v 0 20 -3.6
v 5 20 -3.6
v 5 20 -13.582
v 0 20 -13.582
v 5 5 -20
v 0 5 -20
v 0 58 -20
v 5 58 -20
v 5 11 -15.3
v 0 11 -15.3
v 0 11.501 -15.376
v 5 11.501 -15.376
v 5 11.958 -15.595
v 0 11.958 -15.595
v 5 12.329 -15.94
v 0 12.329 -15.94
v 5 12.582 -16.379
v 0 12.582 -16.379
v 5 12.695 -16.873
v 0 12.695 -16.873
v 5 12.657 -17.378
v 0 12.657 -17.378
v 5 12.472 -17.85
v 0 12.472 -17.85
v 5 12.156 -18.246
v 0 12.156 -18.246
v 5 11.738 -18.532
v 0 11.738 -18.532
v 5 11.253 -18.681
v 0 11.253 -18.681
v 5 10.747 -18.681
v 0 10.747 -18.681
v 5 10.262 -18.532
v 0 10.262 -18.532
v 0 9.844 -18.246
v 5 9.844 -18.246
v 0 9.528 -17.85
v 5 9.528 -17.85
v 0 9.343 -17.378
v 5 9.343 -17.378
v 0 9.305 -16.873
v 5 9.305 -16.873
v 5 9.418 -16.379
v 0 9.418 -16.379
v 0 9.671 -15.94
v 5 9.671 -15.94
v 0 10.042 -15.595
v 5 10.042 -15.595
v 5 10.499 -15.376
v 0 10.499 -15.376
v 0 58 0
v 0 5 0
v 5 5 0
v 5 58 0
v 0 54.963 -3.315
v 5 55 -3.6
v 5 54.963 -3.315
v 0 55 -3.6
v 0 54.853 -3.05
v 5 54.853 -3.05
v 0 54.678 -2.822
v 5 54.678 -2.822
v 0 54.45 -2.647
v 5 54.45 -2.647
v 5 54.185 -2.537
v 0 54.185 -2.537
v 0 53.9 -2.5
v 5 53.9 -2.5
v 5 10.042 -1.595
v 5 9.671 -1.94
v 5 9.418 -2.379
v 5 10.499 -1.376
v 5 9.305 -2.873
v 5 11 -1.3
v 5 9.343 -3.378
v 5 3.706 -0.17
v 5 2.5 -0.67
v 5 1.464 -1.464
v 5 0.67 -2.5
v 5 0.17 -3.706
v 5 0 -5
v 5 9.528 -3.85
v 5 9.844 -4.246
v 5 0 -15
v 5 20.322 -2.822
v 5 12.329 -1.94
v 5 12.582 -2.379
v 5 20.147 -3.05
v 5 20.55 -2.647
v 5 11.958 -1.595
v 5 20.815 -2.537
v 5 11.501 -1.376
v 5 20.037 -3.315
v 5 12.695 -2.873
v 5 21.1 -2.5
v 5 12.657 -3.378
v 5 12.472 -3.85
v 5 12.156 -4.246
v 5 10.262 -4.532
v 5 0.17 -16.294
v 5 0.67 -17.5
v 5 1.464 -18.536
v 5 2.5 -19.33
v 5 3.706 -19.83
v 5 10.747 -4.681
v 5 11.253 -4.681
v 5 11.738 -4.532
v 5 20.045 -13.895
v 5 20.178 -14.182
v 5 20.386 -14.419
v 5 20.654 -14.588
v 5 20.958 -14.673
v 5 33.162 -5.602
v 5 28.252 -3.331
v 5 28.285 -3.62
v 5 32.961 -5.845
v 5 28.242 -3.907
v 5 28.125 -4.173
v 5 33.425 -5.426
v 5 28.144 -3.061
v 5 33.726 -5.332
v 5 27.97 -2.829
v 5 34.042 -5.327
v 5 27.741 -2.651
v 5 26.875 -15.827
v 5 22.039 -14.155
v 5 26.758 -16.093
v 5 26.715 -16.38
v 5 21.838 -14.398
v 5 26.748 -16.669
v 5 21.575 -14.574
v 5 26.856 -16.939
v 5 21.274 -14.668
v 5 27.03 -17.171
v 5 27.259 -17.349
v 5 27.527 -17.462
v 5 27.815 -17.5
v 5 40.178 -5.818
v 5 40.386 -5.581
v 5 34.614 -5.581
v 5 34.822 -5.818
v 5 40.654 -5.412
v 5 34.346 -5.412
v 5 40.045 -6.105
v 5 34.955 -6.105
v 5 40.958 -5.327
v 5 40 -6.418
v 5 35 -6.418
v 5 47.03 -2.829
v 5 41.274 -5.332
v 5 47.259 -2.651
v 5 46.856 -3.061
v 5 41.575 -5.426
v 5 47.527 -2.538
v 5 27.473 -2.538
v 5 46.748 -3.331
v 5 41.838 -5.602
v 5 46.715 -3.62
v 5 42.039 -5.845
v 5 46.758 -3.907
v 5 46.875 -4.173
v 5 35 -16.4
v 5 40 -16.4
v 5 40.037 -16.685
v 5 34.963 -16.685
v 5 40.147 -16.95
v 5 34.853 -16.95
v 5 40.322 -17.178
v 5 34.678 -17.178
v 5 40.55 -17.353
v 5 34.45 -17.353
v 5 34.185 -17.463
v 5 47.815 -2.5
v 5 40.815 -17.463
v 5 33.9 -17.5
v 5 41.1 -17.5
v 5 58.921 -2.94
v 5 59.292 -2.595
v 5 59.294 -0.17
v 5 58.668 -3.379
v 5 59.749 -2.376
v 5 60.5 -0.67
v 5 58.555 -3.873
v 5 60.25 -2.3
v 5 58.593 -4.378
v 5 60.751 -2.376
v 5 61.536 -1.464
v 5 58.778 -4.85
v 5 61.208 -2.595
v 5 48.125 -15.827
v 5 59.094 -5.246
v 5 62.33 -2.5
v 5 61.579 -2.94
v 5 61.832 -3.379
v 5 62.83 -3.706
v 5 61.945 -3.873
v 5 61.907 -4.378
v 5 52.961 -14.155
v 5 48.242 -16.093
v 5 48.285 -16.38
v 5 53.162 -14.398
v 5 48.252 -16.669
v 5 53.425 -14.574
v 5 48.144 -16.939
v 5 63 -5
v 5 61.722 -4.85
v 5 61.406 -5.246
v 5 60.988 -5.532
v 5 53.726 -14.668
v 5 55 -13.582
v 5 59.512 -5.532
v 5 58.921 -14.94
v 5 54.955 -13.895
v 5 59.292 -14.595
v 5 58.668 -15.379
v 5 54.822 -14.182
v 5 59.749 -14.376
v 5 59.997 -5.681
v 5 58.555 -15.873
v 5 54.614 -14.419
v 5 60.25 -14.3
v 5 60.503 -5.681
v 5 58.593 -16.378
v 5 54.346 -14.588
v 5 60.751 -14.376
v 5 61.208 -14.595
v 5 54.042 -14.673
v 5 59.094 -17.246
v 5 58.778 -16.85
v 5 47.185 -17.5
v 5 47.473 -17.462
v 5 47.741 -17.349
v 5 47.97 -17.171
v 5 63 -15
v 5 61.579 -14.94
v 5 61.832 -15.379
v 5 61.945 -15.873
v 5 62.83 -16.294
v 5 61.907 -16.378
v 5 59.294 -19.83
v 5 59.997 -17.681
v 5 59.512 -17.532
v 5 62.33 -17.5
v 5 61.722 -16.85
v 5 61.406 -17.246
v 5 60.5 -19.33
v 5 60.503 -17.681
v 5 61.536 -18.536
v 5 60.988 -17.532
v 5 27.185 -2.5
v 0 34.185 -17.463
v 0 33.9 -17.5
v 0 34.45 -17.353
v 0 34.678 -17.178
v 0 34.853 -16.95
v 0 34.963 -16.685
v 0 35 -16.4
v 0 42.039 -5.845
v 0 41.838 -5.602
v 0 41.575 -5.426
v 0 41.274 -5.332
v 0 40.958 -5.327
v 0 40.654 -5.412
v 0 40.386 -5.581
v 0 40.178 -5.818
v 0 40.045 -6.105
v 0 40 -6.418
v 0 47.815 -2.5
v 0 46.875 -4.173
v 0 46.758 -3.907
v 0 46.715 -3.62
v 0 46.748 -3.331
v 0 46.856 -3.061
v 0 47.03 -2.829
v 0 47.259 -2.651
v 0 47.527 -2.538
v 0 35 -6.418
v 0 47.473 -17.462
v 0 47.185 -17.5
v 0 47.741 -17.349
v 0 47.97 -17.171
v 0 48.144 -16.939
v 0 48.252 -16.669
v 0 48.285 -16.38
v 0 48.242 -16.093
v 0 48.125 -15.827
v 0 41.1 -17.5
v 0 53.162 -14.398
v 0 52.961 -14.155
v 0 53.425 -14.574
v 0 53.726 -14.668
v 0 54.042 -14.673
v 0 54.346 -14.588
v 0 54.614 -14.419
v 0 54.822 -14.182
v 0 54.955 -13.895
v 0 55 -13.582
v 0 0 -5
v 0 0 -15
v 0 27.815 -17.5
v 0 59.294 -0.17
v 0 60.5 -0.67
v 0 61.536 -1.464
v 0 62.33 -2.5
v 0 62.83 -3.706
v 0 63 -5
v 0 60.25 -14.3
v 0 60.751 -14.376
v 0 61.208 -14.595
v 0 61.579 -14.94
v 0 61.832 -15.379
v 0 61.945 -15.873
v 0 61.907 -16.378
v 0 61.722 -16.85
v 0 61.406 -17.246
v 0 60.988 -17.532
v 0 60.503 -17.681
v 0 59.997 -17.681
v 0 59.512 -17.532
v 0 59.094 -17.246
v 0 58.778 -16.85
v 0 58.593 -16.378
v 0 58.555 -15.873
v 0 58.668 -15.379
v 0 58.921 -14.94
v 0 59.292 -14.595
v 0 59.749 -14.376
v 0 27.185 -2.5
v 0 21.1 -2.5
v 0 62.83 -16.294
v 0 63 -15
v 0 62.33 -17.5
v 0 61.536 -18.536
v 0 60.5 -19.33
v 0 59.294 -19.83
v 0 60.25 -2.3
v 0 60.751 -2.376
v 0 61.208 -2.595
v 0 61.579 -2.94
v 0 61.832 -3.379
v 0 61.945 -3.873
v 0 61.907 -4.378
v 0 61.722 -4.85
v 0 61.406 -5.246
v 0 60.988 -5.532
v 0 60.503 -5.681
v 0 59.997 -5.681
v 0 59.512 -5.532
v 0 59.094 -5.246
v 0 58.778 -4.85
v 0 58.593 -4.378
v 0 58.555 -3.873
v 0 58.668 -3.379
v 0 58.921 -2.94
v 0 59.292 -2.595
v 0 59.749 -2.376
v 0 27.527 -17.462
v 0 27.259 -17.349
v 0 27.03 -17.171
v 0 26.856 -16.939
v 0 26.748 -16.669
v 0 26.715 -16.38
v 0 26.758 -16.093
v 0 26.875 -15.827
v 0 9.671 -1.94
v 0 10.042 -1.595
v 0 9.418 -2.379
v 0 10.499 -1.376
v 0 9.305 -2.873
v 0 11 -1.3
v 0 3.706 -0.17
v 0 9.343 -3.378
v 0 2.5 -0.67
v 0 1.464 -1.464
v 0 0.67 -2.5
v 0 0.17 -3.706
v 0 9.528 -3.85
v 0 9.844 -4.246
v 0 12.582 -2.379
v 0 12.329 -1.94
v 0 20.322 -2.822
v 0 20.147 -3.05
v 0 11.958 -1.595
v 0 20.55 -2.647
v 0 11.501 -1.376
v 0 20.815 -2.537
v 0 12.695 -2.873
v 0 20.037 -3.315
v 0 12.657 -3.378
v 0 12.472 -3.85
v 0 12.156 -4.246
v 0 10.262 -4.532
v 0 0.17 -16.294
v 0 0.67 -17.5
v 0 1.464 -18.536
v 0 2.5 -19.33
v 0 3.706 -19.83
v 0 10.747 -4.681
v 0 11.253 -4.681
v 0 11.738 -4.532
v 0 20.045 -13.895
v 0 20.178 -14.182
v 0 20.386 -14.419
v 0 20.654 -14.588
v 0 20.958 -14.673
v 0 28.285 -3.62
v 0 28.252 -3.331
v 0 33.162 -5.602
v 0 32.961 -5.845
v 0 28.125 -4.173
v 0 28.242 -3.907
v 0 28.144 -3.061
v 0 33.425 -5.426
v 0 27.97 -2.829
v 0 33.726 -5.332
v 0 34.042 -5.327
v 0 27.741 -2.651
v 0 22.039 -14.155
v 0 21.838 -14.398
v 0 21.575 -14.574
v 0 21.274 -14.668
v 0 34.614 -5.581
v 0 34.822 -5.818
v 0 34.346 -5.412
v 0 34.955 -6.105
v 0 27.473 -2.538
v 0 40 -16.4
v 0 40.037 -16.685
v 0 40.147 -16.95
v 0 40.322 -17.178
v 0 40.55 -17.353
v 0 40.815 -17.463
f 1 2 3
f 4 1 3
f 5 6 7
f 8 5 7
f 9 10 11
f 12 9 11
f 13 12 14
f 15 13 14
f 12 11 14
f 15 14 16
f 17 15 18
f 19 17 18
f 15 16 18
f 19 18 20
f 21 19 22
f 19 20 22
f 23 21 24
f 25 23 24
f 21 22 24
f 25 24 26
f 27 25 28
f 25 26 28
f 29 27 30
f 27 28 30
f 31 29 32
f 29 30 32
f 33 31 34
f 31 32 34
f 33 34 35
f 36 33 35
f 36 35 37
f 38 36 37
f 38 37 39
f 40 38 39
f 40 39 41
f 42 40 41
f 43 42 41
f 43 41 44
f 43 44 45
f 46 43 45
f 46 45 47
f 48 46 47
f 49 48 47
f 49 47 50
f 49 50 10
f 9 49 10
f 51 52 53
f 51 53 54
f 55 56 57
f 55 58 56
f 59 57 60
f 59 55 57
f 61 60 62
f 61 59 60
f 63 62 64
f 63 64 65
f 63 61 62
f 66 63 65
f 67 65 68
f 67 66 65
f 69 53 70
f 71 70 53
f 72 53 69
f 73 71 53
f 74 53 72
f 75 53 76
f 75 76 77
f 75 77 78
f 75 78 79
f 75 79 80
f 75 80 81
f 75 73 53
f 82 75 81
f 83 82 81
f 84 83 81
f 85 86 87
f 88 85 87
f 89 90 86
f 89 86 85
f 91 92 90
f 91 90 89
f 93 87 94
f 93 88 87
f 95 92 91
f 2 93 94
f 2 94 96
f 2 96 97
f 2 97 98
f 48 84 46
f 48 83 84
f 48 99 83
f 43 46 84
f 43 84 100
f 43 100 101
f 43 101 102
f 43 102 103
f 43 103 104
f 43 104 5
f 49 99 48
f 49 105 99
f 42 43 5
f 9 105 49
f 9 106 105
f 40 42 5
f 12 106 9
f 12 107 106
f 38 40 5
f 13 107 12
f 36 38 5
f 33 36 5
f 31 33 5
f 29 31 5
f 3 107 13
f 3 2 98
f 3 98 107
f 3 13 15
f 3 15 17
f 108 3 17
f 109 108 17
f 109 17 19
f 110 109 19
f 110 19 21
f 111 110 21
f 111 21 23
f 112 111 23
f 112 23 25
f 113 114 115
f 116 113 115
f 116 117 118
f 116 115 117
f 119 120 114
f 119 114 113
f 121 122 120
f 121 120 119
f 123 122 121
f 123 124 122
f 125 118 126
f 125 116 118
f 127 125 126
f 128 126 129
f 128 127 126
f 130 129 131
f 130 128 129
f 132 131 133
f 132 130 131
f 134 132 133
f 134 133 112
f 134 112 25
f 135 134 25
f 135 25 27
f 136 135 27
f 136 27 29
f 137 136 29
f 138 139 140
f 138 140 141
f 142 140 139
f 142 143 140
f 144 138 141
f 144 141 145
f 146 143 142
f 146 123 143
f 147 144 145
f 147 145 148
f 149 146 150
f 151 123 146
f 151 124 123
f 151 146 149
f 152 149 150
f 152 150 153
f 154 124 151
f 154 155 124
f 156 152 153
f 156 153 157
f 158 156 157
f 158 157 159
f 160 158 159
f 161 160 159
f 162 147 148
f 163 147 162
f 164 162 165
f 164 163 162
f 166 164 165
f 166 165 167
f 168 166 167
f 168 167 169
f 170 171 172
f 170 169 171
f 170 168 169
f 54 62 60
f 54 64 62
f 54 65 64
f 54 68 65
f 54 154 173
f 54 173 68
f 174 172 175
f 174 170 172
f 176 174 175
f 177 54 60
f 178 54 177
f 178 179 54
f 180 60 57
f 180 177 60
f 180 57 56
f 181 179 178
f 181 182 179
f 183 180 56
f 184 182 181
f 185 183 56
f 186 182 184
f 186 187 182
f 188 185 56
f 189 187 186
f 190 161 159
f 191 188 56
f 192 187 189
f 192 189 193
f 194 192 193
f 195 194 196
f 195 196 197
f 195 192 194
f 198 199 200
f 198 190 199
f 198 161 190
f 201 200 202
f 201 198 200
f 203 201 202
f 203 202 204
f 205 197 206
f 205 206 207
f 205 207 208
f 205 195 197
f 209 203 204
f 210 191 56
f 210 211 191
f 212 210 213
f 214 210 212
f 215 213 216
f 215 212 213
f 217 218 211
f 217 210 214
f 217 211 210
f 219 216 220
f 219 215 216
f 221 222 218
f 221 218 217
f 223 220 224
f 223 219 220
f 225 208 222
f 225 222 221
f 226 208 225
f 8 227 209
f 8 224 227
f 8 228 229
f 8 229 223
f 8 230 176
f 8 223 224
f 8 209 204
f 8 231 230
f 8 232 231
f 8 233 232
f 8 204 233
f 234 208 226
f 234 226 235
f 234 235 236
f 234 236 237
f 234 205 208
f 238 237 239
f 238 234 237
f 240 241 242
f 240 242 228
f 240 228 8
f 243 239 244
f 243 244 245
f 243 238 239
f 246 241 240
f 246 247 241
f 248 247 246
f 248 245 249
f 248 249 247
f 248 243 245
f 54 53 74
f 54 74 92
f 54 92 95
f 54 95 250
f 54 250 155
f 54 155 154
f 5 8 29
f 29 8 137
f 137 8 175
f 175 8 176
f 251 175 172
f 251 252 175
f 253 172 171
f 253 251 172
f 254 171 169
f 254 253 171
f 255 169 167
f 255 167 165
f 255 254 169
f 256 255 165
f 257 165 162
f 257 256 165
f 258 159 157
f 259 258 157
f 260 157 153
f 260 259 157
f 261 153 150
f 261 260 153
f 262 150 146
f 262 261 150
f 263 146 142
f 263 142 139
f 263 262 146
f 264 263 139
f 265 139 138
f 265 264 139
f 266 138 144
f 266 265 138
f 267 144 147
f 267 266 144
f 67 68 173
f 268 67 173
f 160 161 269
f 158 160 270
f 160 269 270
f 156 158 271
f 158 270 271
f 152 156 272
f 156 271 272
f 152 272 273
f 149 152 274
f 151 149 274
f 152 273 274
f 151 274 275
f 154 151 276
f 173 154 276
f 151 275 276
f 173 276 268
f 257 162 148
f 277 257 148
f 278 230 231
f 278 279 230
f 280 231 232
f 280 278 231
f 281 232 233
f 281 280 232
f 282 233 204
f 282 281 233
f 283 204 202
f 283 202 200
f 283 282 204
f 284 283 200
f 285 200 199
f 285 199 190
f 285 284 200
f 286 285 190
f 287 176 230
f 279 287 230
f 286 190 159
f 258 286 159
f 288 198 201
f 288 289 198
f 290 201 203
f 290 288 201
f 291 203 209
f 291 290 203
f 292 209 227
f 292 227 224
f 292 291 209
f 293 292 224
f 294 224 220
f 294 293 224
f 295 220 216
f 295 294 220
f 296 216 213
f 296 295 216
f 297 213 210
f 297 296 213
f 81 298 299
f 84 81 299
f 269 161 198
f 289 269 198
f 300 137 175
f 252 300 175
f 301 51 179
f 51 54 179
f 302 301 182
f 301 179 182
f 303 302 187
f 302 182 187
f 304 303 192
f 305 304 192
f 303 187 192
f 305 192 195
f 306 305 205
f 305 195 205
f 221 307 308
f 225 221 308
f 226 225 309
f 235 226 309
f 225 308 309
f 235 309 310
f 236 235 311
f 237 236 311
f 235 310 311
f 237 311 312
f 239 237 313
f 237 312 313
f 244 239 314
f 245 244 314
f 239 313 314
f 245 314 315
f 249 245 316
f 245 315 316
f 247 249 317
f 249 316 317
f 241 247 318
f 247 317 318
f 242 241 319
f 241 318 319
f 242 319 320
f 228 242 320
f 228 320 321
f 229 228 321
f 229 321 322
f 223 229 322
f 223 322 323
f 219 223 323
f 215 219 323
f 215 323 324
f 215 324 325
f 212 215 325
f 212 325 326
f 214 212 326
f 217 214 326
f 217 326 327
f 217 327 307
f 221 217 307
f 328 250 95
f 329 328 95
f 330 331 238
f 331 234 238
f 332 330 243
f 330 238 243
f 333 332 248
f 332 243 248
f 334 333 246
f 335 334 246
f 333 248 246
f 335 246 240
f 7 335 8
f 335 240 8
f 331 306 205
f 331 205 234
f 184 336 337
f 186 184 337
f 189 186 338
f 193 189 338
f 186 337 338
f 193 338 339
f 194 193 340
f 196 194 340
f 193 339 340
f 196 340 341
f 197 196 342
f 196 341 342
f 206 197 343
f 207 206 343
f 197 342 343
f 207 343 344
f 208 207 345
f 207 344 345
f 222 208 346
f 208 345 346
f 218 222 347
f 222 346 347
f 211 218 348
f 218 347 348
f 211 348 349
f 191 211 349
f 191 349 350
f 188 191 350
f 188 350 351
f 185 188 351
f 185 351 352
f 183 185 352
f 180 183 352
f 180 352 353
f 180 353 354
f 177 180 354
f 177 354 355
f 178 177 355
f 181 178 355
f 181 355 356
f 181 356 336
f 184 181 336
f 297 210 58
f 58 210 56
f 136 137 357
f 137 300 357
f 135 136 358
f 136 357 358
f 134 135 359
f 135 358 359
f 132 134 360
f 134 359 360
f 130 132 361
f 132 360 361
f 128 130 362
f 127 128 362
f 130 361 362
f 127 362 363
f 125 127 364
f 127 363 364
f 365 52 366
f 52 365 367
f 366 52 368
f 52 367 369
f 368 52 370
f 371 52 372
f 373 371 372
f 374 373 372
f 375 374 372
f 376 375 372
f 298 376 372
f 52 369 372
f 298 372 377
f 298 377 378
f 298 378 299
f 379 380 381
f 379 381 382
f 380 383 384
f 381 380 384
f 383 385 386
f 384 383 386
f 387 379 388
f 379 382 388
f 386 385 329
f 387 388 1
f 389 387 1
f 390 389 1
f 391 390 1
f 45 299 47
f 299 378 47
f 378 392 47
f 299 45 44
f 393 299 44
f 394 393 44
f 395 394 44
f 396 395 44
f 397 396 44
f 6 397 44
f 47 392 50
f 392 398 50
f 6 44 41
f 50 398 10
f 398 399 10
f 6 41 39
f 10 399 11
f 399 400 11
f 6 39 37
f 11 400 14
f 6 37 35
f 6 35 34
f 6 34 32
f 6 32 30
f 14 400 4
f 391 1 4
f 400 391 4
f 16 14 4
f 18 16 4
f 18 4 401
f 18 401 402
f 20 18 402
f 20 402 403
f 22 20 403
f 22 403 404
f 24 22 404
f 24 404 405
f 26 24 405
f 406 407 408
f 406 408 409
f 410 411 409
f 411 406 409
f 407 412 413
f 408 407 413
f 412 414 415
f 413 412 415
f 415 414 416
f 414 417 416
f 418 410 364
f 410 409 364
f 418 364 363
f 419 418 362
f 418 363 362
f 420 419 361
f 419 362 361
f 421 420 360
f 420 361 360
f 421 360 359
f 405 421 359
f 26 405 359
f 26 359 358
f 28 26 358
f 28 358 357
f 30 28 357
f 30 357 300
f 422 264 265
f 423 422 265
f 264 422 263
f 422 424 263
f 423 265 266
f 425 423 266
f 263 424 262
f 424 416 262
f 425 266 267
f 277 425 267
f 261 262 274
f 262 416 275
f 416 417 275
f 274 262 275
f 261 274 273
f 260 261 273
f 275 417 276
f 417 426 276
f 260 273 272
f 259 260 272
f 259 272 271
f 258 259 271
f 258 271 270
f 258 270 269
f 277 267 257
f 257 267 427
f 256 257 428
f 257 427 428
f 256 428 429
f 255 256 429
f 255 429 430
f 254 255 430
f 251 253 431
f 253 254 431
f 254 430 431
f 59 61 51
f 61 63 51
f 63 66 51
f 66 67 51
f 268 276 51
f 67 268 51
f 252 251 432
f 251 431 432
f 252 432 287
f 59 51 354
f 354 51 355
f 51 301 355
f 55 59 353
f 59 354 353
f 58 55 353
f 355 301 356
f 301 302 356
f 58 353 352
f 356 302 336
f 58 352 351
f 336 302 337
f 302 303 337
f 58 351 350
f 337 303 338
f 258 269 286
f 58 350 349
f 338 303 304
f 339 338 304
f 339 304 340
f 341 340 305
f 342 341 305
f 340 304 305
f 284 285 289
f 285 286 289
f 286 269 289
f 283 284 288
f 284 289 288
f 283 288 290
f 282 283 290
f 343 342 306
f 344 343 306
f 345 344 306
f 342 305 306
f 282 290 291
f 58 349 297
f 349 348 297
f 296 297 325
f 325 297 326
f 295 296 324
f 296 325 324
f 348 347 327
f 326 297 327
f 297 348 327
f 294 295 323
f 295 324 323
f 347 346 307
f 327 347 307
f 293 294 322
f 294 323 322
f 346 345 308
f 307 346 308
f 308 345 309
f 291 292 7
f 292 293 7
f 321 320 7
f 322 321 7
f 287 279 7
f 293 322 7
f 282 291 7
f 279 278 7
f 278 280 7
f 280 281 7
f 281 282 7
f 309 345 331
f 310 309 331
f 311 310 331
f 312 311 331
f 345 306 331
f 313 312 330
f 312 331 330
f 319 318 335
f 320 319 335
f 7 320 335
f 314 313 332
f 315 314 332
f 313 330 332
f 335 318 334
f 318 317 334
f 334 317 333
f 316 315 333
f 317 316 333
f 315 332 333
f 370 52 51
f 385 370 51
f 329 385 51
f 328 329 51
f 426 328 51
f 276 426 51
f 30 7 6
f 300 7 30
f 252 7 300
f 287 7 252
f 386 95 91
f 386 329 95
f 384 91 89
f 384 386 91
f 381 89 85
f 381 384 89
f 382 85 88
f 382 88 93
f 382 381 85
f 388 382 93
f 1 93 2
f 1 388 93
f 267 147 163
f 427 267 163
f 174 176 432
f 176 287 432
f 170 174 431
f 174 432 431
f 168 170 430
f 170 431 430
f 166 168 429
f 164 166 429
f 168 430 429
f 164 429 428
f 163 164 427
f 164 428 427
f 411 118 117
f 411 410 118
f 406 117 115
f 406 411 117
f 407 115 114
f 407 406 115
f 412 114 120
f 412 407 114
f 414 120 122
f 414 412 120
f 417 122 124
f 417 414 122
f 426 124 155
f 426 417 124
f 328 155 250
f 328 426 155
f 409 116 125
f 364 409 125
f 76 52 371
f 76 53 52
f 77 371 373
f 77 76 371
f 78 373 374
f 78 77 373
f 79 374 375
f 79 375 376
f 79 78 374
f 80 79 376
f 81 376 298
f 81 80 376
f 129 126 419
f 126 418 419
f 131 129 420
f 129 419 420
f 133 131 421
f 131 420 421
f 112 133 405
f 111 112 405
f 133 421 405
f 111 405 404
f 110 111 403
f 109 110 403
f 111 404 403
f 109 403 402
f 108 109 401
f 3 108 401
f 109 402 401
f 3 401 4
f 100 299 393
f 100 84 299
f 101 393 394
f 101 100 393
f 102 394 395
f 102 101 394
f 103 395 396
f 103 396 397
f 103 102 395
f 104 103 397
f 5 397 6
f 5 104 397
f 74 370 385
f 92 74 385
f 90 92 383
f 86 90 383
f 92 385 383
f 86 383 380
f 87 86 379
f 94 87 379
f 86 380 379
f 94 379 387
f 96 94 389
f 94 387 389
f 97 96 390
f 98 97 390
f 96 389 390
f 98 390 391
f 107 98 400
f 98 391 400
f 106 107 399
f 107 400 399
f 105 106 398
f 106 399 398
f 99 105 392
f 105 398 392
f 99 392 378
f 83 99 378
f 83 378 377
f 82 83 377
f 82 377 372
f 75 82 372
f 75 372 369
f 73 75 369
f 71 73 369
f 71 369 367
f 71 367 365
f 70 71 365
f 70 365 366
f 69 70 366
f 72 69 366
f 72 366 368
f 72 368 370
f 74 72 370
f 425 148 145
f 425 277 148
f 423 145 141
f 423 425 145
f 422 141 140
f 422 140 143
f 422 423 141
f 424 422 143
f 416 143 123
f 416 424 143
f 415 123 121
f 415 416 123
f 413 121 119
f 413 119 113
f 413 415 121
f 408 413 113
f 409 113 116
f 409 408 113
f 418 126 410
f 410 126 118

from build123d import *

# Parameters (mm, degrees)
SKETCH_1_W          = 20
SKETCH_1_H          = 63
EXTRUDE_1_DEPTH     = 5
HOLE_WIZARD_M3_1_D  = 3.4
FILLET_1_R          = 5
CUT_EXTRUDE_1_DEPTH = 10
FILLET_2_R          = 1.1


with BuildPart() as part:
    # 草图1 → 凸台-拉伸1 (new body)
    with BuildSketch(Plane(origin=(0, 0, 0), x_dir=(0, 0, -1), z_dir=(1, 0, 0))):
        with Locations((10, 31.5)):
            Rectangle(SKETCH_1_W, SKETCH_1_H)
    extrude(amount=EXTRUDE_1_DEPTH)

    # M3 间隙孔1 (through all)
    with Locations(Plane(origin=(5, 0, 0), x_dir=(0, 0, -1), z_dir=(1, 0, 0))):
        with Locations((3, 11), (17, 11), (16, 60.25), (4, 60.25)):
            Hole(HOLE_WIZARD_M3_1_D / 2)

    # 圆角1
    fillet_1_edges = [part.edges().sort_by_distance(p)[0] for p in [
        (2.5, 63, 0),
        (2.5, 63, -20),
        (2.5, 0, -20),
        (2.5, 0, 0),
    ]]
    fillet(fillet_1_edges, radius=FILLET_1_R)

    # 草图4 → 切除-拉伸1 (cut)
    with BuildSketch(Plane(origin=(5, 0, 0), x_dir=(0, 0, -1), z_dir=(1, 0, 0))):
        Polygon((2.5, 45.855823048), (17.5, 55), (2.5, 55), align=None)
        Polygon((17.5, 40), (17.5, 49.144176952), (2.5, 40), align=None)
        Polygon((17.5, 25.855823048), (17.5, 35), (2.5, 35), align=None)
        Polygon((17.5, 20), (2.5, 29.144176952), (2.5, 20), align=None)
    extrude(amount=-CUT_EXTRUDE_1_DEPTH, mode=Mode.SUBTRACT)

    # 圆角2
    fillet_2_edges = [part.edges().sort_by_distance(p)[0] for p in [
        (2.5, 55, -17.5),
        (2.5, 45.855823048, -2.5),
        (2.5, 55, -2.5),
        (2.5, 40, -2.5),
        (2.5, 49.144176952, -17.5),
        (2.5, 40, -17.5),
        (2.5, 25.855823048, -17.5),
        (2.5, 35, -2.5),
        (2.5, 35, -17.5),
        (2.5, 20, -17.5),
        (2.5, 20, -2.5),
        (2.5, 29.144176952, -2.5),
    ]]
    fillet(fillet_2_edges, radius=FILLET_2_R)


solid = part.part
